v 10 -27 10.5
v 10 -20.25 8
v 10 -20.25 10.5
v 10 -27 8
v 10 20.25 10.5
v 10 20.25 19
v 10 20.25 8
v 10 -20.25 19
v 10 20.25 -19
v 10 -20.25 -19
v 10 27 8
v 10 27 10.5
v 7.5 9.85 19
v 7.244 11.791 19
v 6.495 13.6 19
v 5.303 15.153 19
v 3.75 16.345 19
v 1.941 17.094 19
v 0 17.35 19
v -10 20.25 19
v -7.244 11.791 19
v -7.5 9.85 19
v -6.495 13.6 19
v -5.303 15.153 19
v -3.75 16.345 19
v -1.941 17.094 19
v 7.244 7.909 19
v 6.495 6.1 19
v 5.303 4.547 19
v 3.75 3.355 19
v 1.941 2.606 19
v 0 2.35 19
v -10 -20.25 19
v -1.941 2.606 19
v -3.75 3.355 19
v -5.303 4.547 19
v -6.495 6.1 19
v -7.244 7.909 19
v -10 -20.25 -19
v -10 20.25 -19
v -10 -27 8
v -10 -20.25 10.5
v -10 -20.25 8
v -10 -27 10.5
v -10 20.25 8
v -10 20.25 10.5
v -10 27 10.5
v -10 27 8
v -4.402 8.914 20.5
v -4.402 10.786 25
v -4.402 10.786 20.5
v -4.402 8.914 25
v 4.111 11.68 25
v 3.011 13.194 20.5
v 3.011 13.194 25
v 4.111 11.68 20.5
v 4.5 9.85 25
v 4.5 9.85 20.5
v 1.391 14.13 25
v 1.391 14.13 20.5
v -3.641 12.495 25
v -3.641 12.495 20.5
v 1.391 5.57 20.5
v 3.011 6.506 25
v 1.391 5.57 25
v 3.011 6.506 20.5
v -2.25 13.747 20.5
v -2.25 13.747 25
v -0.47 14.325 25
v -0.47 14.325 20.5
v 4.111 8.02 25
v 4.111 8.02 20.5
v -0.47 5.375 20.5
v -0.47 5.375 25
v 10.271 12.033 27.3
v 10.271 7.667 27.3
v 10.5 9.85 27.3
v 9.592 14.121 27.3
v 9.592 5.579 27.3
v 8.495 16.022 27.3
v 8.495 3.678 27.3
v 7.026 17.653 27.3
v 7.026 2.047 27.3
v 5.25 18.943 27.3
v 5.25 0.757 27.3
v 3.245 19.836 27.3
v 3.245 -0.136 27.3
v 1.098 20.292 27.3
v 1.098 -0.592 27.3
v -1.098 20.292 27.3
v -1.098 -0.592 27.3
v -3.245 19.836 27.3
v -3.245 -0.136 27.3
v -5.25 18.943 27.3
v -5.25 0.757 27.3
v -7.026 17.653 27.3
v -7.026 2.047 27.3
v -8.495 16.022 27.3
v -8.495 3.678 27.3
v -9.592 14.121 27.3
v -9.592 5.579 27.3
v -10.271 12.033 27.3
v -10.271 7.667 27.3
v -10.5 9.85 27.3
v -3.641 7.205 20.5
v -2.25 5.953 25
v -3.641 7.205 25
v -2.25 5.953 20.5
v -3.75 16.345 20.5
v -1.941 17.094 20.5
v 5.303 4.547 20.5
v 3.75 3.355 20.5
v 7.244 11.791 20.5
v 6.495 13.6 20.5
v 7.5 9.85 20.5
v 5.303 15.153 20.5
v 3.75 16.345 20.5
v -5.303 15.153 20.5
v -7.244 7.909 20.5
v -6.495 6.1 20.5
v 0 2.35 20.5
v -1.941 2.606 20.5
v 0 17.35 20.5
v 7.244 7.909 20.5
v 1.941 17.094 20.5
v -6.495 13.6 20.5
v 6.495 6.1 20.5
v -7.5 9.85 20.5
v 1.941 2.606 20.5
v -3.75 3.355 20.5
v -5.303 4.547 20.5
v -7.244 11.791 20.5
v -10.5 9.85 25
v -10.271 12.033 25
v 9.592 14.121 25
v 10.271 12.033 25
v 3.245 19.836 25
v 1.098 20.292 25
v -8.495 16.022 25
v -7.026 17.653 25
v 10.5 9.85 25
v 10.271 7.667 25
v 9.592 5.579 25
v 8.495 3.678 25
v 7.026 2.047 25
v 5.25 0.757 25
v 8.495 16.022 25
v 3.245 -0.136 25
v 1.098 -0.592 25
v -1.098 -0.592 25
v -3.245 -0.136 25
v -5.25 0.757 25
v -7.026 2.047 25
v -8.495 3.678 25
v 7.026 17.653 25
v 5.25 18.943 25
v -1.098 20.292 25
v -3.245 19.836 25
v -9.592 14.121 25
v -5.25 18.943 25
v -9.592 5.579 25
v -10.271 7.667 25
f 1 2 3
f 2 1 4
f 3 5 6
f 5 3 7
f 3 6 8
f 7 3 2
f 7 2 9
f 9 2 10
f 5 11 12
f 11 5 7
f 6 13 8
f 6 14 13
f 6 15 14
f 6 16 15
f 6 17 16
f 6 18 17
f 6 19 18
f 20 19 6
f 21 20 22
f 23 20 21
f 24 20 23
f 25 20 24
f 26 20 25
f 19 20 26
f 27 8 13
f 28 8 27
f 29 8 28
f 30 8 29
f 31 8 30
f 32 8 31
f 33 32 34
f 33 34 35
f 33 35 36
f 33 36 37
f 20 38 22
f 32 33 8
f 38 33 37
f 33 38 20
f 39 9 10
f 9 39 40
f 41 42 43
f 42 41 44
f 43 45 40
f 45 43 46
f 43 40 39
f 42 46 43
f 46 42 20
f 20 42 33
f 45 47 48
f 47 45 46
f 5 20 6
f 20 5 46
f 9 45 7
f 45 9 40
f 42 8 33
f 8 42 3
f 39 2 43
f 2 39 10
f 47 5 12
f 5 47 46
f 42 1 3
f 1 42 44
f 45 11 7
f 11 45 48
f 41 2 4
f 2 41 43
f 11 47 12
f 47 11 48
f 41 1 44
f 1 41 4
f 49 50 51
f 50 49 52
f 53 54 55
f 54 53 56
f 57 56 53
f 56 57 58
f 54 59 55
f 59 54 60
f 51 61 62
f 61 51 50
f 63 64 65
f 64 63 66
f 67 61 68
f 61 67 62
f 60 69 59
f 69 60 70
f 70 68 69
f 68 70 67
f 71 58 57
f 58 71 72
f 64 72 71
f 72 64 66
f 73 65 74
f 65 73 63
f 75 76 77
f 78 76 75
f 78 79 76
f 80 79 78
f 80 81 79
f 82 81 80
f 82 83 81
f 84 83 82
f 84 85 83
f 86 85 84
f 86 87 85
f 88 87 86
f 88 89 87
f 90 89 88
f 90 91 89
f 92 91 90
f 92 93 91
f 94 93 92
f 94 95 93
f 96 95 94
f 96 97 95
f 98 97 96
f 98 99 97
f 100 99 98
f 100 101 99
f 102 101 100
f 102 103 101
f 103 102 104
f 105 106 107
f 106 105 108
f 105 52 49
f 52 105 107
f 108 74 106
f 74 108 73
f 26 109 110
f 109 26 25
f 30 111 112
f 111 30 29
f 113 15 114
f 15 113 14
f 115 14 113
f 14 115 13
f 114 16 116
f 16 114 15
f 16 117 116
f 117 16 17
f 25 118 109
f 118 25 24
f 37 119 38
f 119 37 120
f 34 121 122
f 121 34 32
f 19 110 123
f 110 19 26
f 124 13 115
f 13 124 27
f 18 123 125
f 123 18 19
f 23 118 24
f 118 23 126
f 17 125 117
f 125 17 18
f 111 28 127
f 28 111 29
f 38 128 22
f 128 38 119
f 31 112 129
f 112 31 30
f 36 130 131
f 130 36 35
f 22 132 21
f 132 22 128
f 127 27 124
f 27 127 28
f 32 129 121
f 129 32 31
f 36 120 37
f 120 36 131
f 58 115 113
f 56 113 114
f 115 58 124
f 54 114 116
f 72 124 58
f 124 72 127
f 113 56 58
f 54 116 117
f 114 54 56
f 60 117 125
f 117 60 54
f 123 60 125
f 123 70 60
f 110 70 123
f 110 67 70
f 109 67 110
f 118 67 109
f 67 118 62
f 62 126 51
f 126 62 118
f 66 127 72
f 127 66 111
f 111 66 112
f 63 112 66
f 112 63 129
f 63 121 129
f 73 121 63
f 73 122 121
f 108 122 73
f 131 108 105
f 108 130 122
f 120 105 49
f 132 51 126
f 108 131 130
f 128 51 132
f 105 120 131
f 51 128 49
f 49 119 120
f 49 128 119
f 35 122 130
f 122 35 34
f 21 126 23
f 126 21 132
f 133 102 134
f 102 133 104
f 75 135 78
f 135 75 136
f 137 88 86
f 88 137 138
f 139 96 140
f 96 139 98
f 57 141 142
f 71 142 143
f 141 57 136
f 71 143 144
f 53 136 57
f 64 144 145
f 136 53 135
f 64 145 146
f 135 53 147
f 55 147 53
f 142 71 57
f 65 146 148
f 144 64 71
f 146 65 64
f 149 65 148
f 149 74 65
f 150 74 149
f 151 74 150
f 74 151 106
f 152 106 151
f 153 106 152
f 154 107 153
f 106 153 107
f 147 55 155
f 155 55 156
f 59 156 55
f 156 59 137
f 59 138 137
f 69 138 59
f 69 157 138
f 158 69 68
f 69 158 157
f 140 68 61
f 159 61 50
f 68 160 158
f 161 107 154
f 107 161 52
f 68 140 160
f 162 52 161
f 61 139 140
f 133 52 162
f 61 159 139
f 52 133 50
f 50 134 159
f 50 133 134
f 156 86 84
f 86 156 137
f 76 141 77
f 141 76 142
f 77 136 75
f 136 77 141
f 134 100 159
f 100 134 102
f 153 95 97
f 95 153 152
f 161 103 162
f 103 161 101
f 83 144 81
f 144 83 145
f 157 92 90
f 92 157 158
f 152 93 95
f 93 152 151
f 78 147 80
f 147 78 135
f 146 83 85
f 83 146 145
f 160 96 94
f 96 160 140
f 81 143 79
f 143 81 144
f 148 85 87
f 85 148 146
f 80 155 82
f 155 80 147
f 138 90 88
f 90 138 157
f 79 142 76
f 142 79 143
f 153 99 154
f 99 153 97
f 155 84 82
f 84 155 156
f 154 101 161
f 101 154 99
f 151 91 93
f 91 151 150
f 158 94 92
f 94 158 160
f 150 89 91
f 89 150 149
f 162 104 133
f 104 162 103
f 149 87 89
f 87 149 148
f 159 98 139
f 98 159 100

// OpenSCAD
width=20;
length=40.5;
height=38;
mountH=2.5;
mountL=54;
mountZ=27;
axOff=10.4;

servo();

module servo(){
    cube([width,length,height],center=true);
    translate([0,0,-height/2+mountH/2+mountZ])cube([width,mountL,mountH],center=true);
    translate([0,length/2-axOff,height/2])cylinder(d=9,h=6+2.3);
    translate([0,length/2-axOff,-height/2])cylinder(d=15,h=39.5);
    translate([0,length/2-axOff,6+height/2])cylinder(d=21,h=2.3);
}
